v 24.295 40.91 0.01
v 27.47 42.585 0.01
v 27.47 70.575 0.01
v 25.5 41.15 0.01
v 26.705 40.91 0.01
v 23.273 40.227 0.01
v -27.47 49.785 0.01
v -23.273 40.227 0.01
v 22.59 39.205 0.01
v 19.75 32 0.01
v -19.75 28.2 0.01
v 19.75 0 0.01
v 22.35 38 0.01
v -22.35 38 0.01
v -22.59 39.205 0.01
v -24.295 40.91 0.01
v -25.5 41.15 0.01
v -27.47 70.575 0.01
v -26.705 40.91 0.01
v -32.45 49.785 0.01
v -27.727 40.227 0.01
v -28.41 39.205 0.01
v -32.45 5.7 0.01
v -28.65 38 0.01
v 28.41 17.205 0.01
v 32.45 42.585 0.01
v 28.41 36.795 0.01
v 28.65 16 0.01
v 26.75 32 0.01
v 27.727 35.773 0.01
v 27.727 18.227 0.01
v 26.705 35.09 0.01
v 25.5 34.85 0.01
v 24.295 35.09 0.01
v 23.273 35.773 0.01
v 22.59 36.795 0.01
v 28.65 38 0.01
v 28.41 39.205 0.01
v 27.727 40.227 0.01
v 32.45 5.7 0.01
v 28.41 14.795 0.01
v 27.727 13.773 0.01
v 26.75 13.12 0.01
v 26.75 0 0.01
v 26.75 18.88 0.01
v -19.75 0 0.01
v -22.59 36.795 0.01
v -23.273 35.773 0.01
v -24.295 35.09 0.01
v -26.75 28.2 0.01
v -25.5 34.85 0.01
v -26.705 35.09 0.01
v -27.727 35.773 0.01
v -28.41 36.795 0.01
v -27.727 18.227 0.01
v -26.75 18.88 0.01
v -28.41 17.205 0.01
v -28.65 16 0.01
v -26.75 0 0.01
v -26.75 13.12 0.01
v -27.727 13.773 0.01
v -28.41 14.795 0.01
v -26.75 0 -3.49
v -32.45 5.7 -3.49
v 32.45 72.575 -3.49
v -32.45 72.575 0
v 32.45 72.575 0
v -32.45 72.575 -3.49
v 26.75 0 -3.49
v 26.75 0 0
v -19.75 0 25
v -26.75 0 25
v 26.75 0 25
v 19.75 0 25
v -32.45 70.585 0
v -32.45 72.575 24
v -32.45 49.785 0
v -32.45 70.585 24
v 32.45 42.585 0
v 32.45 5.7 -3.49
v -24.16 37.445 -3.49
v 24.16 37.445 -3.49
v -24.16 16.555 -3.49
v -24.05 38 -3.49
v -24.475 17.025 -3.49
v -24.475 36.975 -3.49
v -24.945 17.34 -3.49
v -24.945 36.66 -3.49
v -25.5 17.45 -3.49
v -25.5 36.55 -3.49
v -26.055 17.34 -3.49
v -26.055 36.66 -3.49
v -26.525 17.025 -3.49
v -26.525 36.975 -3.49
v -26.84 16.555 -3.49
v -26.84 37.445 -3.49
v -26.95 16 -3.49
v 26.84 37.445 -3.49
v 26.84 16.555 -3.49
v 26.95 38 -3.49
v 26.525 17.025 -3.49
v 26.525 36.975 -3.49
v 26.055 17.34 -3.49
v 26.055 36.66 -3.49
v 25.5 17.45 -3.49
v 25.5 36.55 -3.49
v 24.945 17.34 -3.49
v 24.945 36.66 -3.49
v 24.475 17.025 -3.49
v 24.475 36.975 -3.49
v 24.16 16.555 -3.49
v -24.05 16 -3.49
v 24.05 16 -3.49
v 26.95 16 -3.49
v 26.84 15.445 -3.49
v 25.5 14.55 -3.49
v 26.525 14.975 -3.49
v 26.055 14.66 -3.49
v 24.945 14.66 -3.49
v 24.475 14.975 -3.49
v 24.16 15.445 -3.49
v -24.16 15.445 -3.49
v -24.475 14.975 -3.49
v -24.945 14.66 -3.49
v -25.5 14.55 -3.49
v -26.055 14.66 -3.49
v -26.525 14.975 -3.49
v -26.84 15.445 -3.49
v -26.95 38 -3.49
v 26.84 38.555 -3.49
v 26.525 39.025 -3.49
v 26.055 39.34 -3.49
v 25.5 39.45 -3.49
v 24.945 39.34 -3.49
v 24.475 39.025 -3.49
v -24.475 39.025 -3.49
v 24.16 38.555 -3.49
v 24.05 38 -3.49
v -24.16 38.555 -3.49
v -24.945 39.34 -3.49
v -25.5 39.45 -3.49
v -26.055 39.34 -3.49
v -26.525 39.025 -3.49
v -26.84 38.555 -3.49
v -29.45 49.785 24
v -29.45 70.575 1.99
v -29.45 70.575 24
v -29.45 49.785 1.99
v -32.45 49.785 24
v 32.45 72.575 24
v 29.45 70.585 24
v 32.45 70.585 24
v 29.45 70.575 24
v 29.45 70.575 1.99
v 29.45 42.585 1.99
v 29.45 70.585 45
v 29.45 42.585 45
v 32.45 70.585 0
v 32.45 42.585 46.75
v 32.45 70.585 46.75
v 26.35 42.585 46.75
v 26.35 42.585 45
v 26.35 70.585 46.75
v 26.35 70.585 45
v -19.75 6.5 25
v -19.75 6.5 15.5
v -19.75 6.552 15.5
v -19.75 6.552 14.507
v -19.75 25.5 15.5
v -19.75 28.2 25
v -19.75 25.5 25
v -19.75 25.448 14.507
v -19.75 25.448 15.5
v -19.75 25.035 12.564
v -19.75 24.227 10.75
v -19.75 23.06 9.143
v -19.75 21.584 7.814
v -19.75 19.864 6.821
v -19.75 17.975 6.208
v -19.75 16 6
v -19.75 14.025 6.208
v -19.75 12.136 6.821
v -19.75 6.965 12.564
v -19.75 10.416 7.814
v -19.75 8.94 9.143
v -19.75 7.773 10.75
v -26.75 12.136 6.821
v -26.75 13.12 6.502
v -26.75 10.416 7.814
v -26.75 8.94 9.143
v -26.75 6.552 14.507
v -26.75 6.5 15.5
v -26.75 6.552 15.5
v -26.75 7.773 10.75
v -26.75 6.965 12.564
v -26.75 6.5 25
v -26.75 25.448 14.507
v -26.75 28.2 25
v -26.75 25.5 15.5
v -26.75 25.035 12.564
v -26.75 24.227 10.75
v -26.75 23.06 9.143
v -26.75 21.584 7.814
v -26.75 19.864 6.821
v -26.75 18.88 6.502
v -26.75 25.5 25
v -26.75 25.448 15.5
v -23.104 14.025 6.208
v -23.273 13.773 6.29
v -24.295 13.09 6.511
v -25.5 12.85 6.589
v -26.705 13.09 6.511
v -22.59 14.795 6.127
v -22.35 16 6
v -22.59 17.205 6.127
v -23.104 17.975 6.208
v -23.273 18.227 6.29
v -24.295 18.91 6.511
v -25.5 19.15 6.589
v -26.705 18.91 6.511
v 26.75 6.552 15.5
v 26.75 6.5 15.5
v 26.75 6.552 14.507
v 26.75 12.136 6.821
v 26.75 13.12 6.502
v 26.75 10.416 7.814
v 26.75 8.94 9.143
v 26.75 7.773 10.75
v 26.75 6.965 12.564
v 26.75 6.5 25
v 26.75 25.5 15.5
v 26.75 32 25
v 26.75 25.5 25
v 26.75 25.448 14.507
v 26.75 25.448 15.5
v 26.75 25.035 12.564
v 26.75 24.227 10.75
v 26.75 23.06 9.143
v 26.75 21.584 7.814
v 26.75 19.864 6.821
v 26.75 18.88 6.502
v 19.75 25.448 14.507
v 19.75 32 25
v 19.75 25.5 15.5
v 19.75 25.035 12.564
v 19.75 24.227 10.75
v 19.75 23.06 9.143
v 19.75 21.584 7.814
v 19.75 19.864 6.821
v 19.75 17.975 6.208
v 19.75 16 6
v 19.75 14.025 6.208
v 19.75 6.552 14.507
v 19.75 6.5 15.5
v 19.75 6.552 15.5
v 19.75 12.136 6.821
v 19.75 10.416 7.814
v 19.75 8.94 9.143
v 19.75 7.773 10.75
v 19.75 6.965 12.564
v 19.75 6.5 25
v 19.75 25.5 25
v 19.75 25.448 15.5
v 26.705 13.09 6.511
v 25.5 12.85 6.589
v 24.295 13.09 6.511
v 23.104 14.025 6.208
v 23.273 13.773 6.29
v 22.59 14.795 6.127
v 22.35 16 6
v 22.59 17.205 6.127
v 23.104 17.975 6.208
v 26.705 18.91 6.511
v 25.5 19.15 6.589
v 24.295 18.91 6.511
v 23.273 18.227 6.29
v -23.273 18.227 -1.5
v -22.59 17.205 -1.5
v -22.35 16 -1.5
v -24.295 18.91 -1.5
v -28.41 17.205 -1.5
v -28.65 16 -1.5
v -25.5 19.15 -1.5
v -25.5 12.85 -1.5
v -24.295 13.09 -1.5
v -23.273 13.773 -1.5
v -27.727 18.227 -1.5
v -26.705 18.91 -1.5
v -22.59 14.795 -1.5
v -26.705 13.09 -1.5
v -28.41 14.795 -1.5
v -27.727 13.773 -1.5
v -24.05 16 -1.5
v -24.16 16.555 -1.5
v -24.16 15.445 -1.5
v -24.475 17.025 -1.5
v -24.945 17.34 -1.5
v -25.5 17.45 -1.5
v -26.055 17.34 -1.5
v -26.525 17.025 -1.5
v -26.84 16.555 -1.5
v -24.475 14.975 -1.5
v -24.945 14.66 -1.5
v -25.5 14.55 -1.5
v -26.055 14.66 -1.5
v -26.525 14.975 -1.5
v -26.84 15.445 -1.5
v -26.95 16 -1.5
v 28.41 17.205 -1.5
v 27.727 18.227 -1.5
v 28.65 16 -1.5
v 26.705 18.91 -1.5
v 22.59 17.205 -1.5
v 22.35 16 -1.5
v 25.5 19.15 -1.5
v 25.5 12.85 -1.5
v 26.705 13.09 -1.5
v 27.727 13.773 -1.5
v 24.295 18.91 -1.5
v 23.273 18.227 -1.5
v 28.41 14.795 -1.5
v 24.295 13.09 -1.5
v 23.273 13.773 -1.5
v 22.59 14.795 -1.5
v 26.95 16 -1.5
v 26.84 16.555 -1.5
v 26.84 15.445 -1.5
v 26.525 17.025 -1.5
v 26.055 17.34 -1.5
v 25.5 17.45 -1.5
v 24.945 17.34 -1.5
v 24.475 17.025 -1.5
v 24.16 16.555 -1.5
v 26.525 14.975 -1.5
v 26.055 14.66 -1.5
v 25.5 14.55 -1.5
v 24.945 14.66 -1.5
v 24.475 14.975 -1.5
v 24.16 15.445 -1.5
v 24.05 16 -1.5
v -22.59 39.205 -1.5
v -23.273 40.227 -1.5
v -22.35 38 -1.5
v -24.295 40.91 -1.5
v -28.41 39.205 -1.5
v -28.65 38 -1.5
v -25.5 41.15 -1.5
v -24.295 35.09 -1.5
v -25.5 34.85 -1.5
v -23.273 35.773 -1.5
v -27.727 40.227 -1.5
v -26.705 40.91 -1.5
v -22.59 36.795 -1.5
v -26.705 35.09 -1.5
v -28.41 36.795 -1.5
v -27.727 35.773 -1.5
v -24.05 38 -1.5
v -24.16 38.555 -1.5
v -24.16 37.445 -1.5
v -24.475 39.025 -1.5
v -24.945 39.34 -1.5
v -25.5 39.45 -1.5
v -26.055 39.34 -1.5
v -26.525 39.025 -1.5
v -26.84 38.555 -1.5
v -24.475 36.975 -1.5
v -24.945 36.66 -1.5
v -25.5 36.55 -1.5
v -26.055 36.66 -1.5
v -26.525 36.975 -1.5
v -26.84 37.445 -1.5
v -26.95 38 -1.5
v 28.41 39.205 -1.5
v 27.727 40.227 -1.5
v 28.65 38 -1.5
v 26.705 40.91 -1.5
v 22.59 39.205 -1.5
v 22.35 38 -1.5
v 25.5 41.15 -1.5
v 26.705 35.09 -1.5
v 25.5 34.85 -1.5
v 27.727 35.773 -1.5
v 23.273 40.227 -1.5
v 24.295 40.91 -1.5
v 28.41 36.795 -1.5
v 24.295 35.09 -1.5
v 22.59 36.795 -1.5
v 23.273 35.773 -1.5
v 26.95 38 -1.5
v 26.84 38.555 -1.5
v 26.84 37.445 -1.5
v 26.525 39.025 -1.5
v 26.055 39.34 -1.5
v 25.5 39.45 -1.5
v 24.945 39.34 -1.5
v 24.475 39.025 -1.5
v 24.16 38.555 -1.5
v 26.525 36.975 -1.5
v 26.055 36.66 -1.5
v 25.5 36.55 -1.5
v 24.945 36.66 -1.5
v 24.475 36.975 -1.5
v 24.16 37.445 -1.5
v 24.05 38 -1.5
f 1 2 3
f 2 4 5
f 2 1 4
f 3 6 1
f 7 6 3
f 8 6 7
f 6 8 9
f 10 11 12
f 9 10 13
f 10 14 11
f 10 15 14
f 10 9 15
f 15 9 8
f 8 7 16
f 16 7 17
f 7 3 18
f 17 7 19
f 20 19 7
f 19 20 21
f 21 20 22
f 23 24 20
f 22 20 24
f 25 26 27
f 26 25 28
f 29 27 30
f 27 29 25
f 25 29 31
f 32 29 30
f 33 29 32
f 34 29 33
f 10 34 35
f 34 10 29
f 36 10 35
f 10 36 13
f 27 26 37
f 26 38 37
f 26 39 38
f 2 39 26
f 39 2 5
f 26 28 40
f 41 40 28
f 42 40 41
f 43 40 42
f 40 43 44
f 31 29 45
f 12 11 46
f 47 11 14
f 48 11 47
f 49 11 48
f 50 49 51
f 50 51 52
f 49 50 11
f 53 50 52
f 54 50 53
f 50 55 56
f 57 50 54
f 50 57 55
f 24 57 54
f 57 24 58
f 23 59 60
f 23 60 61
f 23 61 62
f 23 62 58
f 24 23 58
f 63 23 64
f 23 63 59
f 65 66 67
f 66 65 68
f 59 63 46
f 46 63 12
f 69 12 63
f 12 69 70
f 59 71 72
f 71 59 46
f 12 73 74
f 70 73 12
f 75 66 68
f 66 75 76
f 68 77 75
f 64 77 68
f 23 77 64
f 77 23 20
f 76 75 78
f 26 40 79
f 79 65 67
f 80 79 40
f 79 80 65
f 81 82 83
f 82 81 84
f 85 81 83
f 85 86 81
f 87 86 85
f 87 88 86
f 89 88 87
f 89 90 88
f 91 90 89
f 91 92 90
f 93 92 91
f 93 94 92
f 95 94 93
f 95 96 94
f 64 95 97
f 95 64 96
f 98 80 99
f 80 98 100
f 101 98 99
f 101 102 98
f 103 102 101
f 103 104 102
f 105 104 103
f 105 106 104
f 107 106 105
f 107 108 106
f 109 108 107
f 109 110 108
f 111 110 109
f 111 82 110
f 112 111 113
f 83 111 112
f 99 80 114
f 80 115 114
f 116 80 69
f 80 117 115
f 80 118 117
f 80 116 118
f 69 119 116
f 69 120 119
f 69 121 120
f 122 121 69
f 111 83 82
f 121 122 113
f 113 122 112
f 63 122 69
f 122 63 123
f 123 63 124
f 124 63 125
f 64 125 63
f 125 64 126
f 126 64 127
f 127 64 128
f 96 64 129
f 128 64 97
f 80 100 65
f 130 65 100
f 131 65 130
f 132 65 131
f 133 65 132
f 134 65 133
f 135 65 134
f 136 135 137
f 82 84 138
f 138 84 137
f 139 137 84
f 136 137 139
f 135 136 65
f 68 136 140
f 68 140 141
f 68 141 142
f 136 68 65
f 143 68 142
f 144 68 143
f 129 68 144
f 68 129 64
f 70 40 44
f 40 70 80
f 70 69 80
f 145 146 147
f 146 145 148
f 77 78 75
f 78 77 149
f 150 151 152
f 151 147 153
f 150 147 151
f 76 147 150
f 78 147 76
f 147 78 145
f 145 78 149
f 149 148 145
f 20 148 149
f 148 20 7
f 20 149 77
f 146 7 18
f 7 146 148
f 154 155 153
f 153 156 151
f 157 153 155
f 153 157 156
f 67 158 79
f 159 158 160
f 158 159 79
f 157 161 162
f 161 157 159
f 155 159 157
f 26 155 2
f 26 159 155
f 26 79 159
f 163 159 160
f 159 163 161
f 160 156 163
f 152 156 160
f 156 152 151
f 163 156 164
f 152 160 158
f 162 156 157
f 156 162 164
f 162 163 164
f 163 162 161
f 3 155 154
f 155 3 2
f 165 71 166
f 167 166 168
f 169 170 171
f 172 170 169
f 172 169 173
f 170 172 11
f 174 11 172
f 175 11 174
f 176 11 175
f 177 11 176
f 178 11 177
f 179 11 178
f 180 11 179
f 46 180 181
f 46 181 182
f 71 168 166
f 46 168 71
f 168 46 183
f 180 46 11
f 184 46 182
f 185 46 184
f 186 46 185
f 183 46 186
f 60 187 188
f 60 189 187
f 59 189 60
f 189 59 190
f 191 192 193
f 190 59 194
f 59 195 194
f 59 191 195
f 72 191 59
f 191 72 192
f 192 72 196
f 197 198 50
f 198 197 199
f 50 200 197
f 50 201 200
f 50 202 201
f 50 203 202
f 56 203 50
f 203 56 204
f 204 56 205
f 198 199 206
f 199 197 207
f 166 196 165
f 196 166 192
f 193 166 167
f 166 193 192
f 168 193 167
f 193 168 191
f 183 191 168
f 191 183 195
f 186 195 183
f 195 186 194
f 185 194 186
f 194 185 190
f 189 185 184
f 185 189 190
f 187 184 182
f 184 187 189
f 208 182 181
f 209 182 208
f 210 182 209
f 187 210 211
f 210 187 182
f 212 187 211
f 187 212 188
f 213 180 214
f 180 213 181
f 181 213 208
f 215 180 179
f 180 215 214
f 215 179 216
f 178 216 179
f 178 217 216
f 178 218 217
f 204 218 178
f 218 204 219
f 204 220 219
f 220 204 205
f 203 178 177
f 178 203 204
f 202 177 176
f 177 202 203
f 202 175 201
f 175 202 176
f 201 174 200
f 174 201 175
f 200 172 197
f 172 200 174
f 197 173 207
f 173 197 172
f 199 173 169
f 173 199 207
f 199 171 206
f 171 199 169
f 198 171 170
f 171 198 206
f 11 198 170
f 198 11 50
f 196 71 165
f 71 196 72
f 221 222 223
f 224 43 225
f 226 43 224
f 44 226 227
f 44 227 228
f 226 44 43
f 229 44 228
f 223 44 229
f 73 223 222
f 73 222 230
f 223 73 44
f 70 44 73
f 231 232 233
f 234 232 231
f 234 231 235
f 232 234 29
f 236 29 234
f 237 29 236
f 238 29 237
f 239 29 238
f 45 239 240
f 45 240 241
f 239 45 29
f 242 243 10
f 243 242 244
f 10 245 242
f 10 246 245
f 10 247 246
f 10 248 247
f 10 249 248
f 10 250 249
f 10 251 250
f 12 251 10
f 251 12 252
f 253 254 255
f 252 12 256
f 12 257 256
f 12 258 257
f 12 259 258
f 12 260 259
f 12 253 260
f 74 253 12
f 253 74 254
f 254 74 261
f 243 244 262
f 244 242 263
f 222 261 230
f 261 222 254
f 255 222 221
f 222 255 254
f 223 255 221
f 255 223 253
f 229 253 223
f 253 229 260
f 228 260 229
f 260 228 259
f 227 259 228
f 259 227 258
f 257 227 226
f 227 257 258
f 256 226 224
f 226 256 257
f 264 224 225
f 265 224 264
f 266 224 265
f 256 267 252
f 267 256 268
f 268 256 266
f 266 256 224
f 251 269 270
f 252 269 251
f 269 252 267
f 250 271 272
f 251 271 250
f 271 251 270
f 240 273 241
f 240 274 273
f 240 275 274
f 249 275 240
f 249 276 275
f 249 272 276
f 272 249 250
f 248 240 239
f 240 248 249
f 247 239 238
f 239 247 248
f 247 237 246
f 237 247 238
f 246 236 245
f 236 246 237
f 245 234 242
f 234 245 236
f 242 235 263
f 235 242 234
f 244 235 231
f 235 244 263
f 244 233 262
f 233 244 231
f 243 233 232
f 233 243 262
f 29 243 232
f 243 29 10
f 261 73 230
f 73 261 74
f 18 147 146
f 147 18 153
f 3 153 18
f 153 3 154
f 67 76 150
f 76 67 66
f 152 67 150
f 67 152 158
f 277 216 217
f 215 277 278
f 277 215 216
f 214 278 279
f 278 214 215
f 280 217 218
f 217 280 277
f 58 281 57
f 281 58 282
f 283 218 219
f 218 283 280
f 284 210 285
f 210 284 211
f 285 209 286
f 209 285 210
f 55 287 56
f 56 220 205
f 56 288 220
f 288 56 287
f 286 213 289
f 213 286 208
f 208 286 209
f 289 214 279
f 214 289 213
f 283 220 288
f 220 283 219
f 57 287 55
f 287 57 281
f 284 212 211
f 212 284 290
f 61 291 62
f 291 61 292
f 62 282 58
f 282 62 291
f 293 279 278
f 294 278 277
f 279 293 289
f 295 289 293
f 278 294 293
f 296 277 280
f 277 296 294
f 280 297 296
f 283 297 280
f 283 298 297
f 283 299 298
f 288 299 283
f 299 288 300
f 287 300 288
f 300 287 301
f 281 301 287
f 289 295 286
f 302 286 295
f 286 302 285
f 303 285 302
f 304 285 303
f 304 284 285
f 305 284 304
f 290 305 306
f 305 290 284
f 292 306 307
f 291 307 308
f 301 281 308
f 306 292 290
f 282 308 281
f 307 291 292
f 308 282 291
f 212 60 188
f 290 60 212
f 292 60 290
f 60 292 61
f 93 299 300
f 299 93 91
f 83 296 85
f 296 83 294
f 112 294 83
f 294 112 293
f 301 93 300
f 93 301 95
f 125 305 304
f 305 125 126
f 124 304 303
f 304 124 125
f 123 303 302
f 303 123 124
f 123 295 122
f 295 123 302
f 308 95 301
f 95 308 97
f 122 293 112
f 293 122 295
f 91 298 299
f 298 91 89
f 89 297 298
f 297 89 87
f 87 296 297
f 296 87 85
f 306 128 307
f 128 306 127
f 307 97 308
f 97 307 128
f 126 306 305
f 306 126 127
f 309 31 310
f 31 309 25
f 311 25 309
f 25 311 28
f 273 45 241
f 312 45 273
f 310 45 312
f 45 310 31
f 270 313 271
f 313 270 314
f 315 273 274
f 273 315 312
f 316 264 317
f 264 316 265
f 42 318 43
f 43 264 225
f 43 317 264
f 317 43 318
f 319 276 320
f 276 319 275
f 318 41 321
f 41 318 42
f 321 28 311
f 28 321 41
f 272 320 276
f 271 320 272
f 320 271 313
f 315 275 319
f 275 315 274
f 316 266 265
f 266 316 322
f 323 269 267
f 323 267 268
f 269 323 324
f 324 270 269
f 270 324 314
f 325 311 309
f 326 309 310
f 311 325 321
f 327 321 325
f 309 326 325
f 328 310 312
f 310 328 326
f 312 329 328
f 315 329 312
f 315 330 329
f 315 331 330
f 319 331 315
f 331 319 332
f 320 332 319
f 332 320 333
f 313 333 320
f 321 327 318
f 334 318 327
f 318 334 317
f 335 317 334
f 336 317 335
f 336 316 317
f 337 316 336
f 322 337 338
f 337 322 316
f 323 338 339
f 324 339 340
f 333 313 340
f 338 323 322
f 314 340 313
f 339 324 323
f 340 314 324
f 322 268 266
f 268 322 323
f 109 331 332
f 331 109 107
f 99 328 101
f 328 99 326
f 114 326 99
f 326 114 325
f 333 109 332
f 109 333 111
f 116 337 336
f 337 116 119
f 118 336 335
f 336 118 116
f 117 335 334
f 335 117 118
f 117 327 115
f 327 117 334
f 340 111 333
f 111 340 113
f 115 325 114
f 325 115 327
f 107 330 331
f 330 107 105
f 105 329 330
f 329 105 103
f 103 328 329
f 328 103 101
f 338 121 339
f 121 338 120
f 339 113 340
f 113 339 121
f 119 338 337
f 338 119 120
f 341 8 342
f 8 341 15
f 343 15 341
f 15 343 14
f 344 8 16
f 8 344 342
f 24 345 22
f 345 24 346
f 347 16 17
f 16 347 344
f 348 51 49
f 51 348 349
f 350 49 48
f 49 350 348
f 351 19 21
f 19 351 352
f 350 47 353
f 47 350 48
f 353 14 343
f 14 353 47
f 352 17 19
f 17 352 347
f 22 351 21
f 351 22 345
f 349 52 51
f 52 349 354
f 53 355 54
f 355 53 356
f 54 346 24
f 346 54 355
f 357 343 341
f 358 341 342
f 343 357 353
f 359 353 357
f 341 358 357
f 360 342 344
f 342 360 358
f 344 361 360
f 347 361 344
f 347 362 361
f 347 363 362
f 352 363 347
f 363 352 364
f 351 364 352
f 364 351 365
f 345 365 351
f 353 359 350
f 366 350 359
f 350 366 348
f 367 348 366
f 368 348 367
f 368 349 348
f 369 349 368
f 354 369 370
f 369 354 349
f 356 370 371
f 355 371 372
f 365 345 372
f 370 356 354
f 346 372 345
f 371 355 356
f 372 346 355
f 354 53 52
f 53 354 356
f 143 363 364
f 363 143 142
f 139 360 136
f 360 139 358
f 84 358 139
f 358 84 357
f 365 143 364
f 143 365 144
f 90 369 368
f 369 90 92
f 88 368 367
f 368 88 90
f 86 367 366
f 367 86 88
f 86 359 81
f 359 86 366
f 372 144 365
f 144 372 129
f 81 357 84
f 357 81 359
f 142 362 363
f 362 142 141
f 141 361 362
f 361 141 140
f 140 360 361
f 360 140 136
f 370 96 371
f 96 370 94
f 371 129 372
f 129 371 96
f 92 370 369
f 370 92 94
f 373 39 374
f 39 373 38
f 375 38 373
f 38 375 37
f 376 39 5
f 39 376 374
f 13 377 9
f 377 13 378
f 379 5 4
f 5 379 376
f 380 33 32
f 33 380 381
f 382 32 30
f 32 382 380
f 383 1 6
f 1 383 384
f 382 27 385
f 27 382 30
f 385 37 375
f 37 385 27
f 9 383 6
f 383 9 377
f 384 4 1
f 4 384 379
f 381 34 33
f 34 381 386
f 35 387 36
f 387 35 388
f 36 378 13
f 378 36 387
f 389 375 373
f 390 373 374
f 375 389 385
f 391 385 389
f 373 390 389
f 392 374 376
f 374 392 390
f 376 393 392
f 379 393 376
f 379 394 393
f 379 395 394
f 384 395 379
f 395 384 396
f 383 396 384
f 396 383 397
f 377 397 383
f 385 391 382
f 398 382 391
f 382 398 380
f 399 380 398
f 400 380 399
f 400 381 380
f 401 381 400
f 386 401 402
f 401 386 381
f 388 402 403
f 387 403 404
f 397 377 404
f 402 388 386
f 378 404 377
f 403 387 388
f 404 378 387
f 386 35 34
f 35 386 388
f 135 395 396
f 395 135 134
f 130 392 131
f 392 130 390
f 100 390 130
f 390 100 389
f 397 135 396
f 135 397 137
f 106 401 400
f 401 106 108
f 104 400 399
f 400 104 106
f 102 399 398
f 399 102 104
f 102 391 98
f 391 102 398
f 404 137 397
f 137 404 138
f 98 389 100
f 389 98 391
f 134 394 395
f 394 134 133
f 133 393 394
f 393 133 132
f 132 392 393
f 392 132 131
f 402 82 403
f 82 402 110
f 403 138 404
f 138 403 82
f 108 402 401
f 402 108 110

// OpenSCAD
plateThickness = 3.5;

// for meshing with remixed penholder
//  http://www.thingiverse.com/thing:1873991
// The penholder should have mounting_bump_thickness = 3.5
// and mounting_bump_diameter = 8


mountingBumpDiameter = 0; //8.5;
mountingBumpPairsCount = 2;
mountingBumpVerticalSpacing = 42;
mountingBumpHorizontalSpacing = 20;

screwHorizontalSpacing = 51; // matches springtool.scad
screwVerticalSpacing = 22;
firstScrewHeight = 16;
screw_hole_diameter = 2.9; // M3
screw_countersink_diameter = 6.3;
screw_countersink_depth = 1.5; // 2.17;
screw_countersink_sides = 16;

module dummy() {}
upperArmThickness = 3;
lowerArmThickness = 7;
upperArmSpacing = 58.8;
upperArmHorizontalSpacing = 58.9;
upperCatchLength = 3.1;
upperCatchThickness = 1.75;
upperShelfLength = 24;
upperShelfThickness = 2;
lowerArmHorizontalSpacing = 39.5;
upperArmMainLength = 45;
upperArmGusset = 2;

rodDiameter = 8.15;
rodCatchDiameter = 19;
rodInset = 6 + rodCatchDiameter/2;
lowerArmLength = rodInset+rodCatchDiameter/2;
lowerArmHeight = 2*6.5+rodCatchDiameter;
rodTopZ = lowerArmHeight - rodCatchDiameter / 2 + rodDiameter / 2;
rightUpperArmStartFromRod = 16;
leftUpperArmStartFromRod = 23.2;
rightUpperArmHeight = 28;
leftUpperArmHeight = 16.4;

plateHeight = rodTopZ+rightUpperArmStartFromRod+rightUpperArmHeight+upperShelfThickness;
mountingBumpsHeight = lowerArmHeight/2-rodCatchDiameter/2;

nudge = 0.01;
plateWidth = upperArmHorizontalSpacing + 2 * upperArmThickness;

screw_positions = [[-screwHorizontalSpacing/2., firstScrewHeight],
[screwHorizontalSpacing/2., firstScrewHeight],
[-screwHorizontalSpacing/2., firstScrewHeight+screwVerticalSpacing],
[screwHorizontalSpacing/2., firstScrewHeight+screwVerticalSpacing]];


module clip() {

// backplate
difference() {
    translate([nudge,-plateWidth/2,0]) rotate([0,-90,0]) linear_extrude(height=plateThickness) difference() {
       corner = (plateWidth - lowerArmHorizontalSpacing)/2-lowerArmThickness;
       square([plateHeight,plateWidth]);
       polygon(points=[[0,0],[0,corner],[corner,0]]);
       polygon(points=[[0,plateWidth],[0,plateWidth-corner],[corner,plateWidth]]);
    }
    for (z = [0:mountingBumpPairsCount-1]) {
        for (sign = [-1:2:1]) {
        verticalAdjust = z%2 != 0 ? mountingBumpDiameter : 0;
        translate([-plateThickness-nudge,sign*mountingBumpHorizontalSpacing/2,mountingBumpsHeight+z*mountingBumpVerticalSpacing+verticalAdjust])
        rotate([90,180*((z%2)),90])
        linear_extrude(height=2*nudge+plateThickness)
         union() {
            translate([0,mountingBumpDiameter/2,0])
            circle(d=mountingBumpDiameter);
            translate([-mountingBumpDiameter/2,0,0]) square([mountingBumpDiameter,mountingBumpDiameter/2]); 
         } 
     } 

    } 
}


// loop over two sides
for (i=[0:1]) {
    sign = i * 2 - 1;
    left = (i==0);
    // left: i = 0, sign = -1
    // right: i = 1, sign = 1
    upperArmStartZ = rodTopZ + (left ? leftUpperArmStartFromRod : rightUpperArmStartFromRod);
    upperArmHeight = ( left ? leftUpperArmHeight : rightUpperArmHeight );

    shelfAreaHeightAdjust = left ? (rightUpperArmStartFromRod+rightUpperArmHeight)-(leftUpperArmStartFromRod+leftUpperArmHeight) : 0;

    // upper arms
    translate([0,sign*(plateWidth/2-upperArmThickness/2),nudge+upperArmStartZ+upperArmHeight/2]) 
    rotate([-sign*90,0,0]) 
        translate([0,-upperArmHeight/2,-upperArmThickness/2]) 
        union() {
        linear_extrude(height=upperArmThickness) 
            union() {
                if (left) {
                square([upperShelfLength, upperArmHeight+shelfAreaHeightAdjust]);
                }
                else {
                square([upperArmMainLength+upperCatchThickness, upperArmHeight]);
                }
            }
        if (!left) { 
            translate([upperArmMainLength,0,0])
                rotate([-90,0,0])
                linear_extrude(height=upperArmHeight)
                translate([0,-upperArmThickness])
                square([upperCatchThickness,upperCatchLength+upperArmThickness]);
        }
        rotate([-90,0,0])
            linear_extrude(height=upperArmHeight+shelfAreaHeightAdjust)
            polygon(points=[[-nudge,upperArmGusset],[upperArmGusset,-nudge],[-nudge,-nudge]]);
        }
        
        
    // lower arms
    armHeightAdjustment = (i==0) ? (6.5-2.7) : 0;
    translate([0,sign*(lowerArmHorizontalSpacing/2+lowerArmThickness/2),0]) rotate([90,0,0]) translate([0,0,-lowerArmThickness/2]) linear_extrude(height=lowerArmThickness) 
    difference() {
        square([lowerArmLength, lowerArmHeight-armHeightAdjustment]);
        translate([rodInset,lowerArmHeight/2]) union() {
            circle(r=rodCatchDiameter/2);
            translate([rodCatchDiameter/2,0]) square([rodCatchDiameter,rodCatchDiameter],center=true);
        }
    } 
}  

translate([0,-plateWidth/2,rodTopZ+rightUpperArmStartFromRod+rightUpperArmHeight]) linear_extrude(height=upperShelfThickness) square([upperShelfLength,plateWidth]); 

}

render(convexity=10)
difference() {
    rotate([0,-90,-90])
        clip();
    for (i=[0:len(screw_positions)-1]) {
        translate([screw_positions[i][0],screw_positions[i][1],-screw_countersink_depth]) {
            cylinder(h=30, d=screw_countersink_diameter, $fn=16);
            translate([0,0,-10]) cylinder(h=30, d=screw_hole_diameter, $fn=16);        
    }
}
}
